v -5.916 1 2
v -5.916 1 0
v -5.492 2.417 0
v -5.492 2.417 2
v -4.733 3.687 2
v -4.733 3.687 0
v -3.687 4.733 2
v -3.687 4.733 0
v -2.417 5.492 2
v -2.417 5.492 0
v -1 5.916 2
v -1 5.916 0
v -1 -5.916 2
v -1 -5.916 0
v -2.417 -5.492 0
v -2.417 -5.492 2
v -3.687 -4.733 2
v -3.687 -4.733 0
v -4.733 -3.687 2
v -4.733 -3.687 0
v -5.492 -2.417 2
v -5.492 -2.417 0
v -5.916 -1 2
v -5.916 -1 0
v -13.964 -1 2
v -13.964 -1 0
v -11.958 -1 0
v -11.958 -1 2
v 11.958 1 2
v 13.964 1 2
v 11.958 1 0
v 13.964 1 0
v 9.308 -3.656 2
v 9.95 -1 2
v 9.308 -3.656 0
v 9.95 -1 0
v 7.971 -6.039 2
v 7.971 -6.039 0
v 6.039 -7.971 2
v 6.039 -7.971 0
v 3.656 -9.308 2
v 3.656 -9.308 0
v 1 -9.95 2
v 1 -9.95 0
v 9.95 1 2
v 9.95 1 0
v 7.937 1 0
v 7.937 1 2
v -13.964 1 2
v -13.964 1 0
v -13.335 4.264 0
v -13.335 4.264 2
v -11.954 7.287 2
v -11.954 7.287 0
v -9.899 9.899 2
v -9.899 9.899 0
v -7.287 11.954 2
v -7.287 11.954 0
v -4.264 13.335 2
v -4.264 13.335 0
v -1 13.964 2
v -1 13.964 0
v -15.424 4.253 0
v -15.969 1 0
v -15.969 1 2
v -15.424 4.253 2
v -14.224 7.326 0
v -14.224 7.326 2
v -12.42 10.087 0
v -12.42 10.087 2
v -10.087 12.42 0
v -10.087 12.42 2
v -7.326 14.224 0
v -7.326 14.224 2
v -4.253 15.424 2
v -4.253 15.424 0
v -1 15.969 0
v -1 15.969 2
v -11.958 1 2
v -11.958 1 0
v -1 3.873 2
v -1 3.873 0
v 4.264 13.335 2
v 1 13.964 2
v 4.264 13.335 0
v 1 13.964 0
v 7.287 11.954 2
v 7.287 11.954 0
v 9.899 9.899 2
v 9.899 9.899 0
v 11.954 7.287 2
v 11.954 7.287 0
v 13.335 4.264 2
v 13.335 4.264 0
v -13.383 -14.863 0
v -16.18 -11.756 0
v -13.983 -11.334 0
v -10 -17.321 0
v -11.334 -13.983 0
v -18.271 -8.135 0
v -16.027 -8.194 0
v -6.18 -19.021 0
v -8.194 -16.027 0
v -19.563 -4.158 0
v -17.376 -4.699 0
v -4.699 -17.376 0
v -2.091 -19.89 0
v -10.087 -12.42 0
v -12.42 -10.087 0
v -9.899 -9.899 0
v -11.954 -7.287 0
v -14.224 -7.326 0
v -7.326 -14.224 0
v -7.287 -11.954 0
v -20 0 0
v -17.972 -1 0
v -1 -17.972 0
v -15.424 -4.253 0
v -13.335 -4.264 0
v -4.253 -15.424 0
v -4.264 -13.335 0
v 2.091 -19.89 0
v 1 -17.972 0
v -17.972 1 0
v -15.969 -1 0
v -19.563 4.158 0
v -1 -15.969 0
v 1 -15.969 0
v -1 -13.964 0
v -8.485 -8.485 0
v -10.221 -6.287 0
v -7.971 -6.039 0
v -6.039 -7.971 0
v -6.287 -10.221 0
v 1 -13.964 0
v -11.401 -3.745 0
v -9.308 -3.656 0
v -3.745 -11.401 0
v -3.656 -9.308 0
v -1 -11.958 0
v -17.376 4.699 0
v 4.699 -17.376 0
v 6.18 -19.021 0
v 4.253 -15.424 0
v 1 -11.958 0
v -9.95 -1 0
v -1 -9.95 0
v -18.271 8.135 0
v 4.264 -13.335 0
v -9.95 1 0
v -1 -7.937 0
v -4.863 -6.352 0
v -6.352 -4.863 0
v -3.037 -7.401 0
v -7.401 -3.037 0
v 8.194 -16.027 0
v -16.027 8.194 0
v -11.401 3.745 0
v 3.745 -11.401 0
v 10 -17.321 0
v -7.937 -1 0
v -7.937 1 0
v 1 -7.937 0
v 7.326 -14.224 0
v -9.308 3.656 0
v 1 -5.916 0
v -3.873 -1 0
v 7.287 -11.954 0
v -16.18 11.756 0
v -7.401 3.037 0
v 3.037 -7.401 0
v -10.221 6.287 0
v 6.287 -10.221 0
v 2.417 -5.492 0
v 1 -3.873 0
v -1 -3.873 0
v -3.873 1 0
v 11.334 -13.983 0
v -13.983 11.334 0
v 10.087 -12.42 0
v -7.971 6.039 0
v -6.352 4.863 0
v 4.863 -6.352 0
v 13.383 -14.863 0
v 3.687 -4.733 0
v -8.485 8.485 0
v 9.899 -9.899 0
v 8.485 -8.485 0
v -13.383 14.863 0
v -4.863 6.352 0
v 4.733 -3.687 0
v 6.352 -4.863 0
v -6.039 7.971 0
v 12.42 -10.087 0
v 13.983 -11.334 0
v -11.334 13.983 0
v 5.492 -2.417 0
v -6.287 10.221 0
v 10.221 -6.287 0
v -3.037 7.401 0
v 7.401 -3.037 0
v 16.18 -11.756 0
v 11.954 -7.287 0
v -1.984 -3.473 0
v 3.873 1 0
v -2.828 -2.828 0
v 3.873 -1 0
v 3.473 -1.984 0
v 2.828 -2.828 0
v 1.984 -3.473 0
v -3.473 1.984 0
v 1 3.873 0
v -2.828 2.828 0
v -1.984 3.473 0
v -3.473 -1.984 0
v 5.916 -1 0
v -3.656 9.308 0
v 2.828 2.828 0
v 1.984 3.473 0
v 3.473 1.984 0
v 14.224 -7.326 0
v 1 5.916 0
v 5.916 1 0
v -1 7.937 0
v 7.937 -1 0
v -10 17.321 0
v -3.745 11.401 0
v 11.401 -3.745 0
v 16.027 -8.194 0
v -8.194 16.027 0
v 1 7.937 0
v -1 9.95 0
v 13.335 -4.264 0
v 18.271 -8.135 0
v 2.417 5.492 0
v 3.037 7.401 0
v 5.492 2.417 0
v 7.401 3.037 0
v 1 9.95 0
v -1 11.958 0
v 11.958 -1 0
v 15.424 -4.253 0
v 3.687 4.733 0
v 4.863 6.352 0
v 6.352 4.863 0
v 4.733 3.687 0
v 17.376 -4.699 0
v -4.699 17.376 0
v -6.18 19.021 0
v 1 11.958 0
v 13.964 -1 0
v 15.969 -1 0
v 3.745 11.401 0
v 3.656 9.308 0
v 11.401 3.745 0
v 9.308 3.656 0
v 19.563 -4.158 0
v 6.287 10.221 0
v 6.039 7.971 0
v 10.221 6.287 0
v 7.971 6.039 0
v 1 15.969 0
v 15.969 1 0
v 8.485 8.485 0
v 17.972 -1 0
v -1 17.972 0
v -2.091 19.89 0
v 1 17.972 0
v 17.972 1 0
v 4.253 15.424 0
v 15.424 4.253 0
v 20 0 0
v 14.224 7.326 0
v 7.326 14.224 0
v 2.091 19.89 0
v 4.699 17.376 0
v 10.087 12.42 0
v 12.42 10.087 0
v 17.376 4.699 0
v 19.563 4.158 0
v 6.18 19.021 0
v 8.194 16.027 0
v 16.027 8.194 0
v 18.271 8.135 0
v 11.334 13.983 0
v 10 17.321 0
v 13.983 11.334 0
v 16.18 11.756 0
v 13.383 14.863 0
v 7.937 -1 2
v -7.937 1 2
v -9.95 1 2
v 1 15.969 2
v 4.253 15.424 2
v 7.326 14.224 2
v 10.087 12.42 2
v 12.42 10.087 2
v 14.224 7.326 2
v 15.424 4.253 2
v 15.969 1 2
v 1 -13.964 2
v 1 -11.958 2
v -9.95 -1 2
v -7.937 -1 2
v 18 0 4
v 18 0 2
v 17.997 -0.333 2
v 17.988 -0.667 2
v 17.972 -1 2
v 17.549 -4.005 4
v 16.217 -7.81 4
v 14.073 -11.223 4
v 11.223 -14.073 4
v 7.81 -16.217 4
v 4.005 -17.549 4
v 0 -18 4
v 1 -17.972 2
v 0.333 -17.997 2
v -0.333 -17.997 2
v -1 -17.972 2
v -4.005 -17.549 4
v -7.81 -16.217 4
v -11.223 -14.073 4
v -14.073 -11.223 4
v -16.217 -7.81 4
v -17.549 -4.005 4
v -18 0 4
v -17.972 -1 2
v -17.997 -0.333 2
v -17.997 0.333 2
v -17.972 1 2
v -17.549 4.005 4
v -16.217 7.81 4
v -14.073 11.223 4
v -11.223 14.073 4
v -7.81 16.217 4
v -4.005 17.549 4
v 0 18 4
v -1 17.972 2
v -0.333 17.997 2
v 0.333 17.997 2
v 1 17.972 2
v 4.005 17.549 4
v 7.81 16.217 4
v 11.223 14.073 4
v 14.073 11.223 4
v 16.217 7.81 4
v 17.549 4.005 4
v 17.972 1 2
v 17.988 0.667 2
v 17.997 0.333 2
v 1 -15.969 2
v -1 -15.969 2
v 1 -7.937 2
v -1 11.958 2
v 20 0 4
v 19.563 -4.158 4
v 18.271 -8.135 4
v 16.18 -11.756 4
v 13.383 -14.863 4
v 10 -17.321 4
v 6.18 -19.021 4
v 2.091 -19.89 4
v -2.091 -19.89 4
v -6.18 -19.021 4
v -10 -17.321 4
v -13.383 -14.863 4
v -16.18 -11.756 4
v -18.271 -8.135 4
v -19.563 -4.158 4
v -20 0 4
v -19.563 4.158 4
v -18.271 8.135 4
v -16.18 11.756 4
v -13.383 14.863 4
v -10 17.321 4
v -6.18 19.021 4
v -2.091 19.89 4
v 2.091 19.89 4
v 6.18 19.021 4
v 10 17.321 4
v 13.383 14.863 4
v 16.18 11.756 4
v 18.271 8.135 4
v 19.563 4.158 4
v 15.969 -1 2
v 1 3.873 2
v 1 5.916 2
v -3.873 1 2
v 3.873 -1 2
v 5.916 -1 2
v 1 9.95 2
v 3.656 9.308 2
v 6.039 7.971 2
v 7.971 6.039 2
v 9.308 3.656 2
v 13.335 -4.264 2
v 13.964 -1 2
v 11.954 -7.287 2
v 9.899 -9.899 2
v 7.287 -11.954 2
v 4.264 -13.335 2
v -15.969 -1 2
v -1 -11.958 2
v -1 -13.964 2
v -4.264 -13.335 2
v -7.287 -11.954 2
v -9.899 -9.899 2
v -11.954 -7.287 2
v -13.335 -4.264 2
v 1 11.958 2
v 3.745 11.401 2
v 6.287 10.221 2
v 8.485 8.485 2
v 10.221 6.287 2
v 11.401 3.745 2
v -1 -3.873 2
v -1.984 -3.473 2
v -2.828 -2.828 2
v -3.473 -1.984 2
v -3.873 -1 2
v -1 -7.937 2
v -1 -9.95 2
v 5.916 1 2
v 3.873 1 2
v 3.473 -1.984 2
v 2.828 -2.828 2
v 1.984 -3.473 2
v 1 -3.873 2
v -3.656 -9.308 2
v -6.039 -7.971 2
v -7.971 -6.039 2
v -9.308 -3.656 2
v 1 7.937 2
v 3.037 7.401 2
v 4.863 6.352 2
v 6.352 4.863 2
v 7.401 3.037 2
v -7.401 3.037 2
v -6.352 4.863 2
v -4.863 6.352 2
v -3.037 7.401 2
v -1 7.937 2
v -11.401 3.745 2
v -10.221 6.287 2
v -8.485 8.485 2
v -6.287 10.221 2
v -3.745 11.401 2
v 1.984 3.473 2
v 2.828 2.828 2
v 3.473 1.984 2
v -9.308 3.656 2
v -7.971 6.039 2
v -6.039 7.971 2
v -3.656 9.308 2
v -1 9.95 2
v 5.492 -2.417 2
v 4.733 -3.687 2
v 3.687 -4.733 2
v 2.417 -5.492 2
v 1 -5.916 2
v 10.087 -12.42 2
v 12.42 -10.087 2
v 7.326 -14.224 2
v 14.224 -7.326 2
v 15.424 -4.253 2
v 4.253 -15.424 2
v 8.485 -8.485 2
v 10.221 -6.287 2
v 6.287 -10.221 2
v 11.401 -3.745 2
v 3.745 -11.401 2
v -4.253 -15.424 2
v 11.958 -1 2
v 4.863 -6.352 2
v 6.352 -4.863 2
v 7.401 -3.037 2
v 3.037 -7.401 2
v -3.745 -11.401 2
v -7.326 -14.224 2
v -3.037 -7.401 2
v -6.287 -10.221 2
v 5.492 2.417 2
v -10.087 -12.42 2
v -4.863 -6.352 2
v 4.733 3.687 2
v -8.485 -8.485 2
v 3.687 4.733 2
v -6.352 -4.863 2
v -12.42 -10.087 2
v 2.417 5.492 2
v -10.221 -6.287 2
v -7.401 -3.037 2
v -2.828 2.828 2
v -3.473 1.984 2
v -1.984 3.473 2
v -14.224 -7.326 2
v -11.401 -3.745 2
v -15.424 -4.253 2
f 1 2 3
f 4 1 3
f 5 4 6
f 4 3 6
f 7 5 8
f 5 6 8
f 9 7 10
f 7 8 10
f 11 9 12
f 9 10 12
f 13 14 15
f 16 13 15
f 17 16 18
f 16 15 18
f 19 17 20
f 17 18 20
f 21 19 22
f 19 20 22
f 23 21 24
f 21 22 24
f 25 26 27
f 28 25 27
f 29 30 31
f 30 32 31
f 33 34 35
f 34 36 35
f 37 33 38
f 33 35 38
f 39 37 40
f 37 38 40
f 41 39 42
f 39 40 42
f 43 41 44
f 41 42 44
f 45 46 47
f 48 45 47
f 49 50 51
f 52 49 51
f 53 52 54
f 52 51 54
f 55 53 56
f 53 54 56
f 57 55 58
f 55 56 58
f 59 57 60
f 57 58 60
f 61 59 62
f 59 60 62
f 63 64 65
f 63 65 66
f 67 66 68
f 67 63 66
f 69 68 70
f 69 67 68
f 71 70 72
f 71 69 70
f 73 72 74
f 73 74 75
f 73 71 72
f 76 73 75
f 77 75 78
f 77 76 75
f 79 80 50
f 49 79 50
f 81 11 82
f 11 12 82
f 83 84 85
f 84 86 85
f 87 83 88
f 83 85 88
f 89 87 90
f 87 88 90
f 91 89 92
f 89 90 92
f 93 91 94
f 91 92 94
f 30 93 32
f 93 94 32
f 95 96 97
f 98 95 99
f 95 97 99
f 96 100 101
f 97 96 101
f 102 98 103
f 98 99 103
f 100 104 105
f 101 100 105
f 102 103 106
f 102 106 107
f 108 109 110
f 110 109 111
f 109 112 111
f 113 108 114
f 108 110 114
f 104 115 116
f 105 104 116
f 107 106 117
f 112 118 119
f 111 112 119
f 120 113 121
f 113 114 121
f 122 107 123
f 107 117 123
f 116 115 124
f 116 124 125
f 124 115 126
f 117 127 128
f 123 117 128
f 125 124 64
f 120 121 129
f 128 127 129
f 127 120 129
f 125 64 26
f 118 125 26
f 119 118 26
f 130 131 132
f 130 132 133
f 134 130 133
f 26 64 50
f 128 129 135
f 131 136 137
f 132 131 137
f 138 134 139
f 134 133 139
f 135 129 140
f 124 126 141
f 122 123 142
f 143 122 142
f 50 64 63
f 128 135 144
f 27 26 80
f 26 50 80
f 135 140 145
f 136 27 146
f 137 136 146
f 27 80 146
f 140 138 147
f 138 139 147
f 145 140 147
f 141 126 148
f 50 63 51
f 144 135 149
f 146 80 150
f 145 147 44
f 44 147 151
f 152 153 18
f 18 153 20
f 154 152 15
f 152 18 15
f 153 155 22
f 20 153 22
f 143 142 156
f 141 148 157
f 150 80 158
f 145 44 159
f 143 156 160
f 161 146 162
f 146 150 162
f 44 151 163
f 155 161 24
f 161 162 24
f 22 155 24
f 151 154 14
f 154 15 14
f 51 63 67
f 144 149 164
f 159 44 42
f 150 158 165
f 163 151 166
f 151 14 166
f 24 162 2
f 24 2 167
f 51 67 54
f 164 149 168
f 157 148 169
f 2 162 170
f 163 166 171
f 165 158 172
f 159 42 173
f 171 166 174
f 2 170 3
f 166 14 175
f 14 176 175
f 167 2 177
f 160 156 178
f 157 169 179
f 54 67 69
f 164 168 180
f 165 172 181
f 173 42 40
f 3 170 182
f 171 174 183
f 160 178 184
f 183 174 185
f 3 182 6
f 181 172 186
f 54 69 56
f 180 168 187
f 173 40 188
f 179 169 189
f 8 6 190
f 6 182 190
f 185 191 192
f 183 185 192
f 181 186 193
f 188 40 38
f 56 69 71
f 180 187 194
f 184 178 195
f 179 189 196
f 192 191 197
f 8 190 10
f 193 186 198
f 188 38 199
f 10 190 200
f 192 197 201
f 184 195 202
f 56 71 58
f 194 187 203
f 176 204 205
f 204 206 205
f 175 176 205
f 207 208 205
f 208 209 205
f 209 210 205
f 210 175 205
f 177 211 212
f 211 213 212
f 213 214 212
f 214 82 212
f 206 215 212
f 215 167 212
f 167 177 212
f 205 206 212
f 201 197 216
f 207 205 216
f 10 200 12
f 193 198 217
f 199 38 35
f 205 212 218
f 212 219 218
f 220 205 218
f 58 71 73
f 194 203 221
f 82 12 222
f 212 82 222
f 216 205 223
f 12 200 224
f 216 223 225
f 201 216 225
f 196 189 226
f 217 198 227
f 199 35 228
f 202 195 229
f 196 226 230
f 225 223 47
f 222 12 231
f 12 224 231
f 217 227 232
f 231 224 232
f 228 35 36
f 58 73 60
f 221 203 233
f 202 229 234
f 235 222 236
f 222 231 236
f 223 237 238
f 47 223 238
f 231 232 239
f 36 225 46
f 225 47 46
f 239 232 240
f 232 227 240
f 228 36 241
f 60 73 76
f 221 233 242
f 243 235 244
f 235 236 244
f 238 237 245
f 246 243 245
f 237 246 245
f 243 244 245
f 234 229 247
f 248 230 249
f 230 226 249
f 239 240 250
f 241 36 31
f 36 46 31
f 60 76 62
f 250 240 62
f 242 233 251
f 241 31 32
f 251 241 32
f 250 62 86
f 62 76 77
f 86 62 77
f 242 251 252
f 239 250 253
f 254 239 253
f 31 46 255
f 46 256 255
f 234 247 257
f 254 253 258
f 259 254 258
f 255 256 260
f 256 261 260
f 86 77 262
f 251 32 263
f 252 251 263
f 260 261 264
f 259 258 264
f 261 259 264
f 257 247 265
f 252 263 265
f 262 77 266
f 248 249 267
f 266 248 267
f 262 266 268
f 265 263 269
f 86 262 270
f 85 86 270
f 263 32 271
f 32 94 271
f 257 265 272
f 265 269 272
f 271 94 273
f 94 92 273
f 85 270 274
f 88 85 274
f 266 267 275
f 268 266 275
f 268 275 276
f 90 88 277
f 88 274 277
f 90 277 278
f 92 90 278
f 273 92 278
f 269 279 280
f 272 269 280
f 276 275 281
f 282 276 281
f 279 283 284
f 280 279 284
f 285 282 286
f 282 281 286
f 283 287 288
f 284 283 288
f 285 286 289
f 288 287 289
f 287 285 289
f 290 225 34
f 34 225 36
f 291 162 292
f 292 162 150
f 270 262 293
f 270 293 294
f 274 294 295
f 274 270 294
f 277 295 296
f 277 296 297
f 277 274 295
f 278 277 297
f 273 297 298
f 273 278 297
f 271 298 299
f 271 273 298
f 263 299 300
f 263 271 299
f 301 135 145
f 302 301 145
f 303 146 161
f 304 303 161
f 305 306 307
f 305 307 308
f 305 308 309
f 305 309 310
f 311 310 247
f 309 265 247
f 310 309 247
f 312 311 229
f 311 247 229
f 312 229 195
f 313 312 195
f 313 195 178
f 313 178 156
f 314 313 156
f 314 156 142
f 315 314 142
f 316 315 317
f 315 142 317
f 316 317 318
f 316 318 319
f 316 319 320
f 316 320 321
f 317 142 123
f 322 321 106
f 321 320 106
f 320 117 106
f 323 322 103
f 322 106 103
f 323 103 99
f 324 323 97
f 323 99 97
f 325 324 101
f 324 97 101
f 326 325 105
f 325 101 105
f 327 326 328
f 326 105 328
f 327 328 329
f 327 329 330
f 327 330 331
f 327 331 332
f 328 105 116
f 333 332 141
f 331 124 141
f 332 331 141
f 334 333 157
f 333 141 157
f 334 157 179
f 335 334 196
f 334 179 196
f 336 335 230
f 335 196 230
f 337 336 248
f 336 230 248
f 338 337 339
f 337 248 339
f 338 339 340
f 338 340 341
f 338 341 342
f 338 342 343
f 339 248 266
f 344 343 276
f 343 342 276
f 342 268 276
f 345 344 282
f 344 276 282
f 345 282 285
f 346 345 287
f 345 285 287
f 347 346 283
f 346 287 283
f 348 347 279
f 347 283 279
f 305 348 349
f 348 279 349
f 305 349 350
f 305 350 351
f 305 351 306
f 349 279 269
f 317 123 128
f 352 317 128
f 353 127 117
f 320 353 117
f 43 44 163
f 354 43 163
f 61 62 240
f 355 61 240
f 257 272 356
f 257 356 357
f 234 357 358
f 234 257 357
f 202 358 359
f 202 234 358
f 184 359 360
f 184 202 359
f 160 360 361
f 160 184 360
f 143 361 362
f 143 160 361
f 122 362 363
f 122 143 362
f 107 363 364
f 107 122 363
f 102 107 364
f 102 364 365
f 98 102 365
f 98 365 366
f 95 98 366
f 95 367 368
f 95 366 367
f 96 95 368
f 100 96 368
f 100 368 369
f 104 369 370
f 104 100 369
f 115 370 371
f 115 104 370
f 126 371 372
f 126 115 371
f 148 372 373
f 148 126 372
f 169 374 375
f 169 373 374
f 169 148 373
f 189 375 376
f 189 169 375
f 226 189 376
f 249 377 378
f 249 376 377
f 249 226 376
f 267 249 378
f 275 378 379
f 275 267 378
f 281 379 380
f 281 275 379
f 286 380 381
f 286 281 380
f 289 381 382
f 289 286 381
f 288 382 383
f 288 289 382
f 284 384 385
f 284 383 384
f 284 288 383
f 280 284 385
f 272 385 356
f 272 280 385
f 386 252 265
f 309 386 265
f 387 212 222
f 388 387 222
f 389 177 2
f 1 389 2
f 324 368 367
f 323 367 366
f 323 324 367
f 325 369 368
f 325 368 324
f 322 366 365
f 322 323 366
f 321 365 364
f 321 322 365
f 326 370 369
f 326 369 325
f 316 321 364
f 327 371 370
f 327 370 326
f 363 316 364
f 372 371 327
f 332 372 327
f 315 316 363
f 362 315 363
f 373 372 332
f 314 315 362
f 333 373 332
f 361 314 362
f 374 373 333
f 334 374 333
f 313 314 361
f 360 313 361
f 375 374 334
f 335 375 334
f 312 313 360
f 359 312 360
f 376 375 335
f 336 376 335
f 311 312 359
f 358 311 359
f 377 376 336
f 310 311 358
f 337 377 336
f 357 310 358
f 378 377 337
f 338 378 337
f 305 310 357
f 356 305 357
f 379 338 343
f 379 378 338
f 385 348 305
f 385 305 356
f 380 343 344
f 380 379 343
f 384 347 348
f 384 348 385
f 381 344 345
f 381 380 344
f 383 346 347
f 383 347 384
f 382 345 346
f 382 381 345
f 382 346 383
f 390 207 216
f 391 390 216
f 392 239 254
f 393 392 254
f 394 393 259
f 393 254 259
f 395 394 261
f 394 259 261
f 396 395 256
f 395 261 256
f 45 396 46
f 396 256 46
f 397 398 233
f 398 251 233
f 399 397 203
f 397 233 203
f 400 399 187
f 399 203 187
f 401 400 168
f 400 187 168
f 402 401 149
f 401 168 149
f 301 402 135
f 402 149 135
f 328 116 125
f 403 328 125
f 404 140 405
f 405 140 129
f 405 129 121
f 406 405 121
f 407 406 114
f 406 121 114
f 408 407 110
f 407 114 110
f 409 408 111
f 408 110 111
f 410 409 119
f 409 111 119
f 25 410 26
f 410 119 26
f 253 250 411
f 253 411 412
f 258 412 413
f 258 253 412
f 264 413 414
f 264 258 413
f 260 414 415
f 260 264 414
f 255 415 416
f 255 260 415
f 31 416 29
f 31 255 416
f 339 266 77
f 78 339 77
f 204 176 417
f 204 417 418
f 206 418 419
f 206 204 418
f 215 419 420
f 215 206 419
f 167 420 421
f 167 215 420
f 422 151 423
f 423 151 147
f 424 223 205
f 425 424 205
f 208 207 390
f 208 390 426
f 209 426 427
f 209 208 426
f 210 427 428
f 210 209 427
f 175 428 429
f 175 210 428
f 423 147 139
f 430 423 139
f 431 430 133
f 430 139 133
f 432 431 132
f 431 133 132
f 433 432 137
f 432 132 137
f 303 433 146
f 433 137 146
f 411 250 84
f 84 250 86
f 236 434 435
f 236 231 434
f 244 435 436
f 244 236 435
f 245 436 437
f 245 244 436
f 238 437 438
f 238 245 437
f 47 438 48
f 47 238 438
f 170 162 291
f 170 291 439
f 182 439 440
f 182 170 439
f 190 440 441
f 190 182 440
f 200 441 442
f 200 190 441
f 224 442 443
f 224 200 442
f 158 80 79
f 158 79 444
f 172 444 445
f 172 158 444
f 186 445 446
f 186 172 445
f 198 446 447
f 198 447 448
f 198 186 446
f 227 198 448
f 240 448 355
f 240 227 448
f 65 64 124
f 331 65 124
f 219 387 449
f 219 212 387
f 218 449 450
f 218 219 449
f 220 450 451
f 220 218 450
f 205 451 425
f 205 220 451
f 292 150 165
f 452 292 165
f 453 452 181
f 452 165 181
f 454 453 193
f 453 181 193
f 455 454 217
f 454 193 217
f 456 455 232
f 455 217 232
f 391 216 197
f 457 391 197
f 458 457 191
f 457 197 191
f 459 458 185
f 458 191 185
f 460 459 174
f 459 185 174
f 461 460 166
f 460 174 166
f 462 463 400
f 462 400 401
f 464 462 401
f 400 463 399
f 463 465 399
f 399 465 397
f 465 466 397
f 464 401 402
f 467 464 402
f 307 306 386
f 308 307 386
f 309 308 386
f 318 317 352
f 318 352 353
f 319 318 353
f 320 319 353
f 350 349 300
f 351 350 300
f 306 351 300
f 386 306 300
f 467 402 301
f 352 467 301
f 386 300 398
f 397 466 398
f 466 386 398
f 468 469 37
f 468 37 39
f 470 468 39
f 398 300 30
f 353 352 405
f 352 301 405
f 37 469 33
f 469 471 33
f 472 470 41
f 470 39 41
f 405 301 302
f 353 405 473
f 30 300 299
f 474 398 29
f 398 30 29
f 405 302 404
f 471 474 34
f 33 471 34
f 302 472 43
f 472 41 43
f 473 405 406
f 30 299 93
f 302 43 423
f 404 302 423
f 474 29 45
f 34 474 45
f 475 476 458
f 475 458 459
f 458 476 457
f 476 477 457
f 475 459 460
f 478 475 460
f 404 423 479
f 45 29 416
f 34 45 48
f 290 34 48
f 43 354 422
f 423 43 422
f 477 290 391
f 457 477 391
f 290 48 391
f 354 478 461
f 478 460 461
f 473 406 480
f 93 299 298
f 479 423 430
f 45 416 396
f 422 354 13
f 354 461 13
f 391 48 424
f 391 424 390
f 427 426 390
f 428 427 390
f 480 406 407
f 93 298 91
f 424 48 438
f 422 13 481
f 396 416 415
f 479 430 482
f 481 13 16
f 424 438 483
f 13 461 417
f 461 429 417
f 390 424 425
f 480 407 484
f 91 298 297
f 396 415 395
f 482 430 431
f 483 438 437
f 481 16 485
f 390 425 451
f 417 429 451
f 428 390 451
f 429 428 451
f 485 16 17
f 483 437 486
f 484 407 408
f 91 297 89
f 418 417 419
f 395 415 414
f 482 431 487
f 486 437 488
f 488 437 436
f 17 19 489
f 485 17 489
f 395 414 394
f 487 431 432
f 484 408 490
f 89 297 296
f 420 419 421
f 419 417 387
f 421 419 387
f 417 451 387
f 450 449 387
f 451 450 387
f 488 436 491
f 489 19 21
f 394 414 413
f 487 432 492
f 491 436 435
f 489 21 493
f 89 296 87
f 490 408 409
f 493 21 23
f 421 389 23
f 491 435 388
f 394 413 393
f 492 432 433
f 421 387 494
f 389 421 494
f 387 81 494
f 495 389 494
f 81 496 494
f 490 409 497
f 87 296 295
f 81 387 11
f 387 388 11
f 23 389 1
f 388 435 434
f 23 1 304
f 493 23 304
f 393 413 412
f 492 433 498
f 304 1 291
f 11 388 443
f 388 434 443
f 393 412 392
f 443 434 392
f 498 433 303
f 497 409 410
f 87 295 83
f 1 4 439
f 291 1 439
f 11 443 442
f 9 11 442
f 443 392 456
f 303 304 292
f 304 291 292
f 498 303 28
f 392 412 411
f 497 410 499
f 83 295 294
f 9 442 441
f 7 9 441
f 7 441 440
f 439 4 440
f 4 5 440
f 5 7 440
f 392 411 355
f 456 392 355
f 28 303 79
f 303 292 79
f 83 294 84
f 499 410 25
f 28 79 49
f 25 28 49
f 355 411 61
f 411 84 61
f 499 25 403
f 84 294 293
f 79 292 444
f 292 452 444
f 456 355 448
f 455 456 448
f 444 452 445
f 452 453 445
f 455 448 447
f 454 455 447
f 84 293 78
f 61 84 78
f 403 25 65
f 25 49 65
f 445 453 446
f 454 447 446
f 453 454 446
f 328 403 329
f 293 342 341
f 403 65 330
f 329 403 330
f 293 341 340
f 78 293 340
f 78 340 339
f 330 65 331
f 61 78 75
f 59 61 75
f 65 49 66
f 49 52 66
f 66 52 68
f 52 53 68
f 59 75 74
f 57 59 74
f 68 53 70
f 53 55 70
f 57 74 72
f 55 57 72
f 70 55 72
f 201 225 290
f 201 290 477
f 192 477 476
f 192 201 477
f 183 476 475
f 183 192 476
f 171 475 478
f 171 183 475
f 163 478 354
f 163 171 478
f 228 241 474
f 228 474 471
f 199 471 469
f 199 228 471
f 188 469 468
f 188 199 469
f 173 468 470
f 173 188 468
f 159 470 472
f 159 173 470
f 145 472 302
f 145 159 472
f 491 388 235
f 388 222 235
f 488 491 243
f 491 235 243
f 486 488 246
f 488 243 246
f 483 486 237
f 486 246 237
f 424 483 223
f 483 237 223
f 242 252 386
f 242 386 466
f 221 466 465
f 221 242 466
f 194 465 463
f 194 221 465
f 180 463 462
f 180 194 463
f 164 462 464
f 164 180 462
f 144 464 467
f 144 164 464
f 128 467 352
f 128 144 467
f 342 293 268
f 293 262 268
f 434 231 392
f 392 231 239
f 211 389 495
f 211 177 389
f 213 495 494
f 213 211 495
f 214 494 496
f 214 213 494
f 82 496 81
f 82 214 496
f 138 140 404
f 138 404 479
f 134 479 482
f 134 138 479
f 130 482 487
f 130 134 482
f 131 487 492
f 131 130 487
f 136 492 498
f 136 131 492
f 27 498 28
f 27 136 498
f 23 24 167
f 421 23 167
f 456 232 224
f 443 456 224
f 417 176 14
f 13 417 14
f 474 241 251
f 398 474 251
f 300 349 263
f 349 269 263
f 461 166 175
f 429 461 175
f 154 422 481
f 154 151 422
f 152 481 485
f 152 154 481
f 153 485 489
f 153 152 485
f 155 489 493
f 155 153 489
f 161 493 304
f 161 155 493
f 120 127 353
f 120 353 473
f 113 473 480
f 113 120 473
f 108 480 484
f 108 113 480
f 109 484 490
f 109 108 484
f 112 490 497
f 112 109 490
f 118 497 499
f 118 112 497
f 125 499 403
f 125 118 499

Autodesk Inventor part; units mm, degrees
ref_plane "YZ Plane" through (0, 0, 0) normal (1, 0, 0) x (0, 1, 0)
ref_plane "XZ Plane" through (0, 0, 0) normal (0, 1, 0) x (-1, 0, 0)
ref_plane "XY Plane" through (0, 0, 0) normal (0, 0, 1) x (1, 0, 0)
sketch "Boceto1" plane through (0, 0, 0) normal (0, 0, 1) x (1, 0, 0)
  circle A0 centre (0, 0) radius 20
  circle A1 centre (0, 0) radius 18
  dimension "d0" = 40
  dimension "d1" = 36
extrude "Extrusión1" add sketch "Boceto1" along normal blind 4
sketch "Boceto2" plane through (0, 0, 0) normal (0, 0, -1) x (-1, 0, 0)
  circle A0 centre (0, 0) radius 16
  circle A1 centre (0, 0) radius 14
  circle A2 centre (0, 0) radius 12
  circle A3 centre (0, 0) radius 10
  circle A4 centre (0, 0) radius 8
  circle A5 centre (0, 0) radius 6
  circle A6 centre (0, 0) radius 4
  dimension "d4" = 32
  dimension "d5" = 28
  dimension "d6" = 24
  dimension "d7" = 20
  dimension "d8" = 16
  dimension "d9" = 12
  dimension "d10" = 8
extrude "Extrusión2" add sketch "Boceto2" against normal blind 2
sketch "Boceto3" plane through (0, 0, 0) normal (0, 0, -1) x (-1, 0, 0)
  line L0 (-19.4045, 1) -> (19.4045, 1)
  line L1 (19.4045, 1) -> (19.4045, -1)
  line L2 (19.4045, -1) -> (-19.4045, -1)
  line L3 (-19.4045, -1) -> (-19.4045, 1)
  line L4 (-19.4045, 1) -> (19.4045, -1) construction
  line L5 (19.4045, 1) -> (-19.4045, -1) construction
  line L6 (-1, 19.4045) -> (1, 19.4045)
  line L7 (1, 19.4045) -> (1, -19.4045)
  line L8 (1, -19.4045) -> (-1, -19.4045)
  line L9 (-1, -19.4045) -> (-1, 19.4045)
  line L10 (-1, 19.4045) -> (1, -19.4045) construction
  line L11 (1, 19.4045) -> (-1, -19.4045) construction
  point P0 (0, 0)
  point P1 (0, 0)
  dimension "d13" = 2
  dimension "d14" = 2
extrude "Extrusión3" add sketch "Boceto3" against normal blind 2
equation "\"Radio_pliegue\" = Grosor"
equation "\"Anchura_desahogo_plegado\" = Grosor"
equation "\"Profundidad_desahogo_plegado\" = 0.5 * Grosor"
equation "\"Tamaño_destalonado\" = 4 * Grosor"
equation "\"Remanente_mínimo\" = 2 * Grosor"
equation "\"Radiodetransición\" = Radio_pliegue"
equation "\"Tamaño_de_radio_de_Jacobi\" = Radio_pliegue"
equation "\"TamañoSeparación\" = Grosor"
equation "\"Grosor\" = 0.5"
properties part number "Lattice bottom"
